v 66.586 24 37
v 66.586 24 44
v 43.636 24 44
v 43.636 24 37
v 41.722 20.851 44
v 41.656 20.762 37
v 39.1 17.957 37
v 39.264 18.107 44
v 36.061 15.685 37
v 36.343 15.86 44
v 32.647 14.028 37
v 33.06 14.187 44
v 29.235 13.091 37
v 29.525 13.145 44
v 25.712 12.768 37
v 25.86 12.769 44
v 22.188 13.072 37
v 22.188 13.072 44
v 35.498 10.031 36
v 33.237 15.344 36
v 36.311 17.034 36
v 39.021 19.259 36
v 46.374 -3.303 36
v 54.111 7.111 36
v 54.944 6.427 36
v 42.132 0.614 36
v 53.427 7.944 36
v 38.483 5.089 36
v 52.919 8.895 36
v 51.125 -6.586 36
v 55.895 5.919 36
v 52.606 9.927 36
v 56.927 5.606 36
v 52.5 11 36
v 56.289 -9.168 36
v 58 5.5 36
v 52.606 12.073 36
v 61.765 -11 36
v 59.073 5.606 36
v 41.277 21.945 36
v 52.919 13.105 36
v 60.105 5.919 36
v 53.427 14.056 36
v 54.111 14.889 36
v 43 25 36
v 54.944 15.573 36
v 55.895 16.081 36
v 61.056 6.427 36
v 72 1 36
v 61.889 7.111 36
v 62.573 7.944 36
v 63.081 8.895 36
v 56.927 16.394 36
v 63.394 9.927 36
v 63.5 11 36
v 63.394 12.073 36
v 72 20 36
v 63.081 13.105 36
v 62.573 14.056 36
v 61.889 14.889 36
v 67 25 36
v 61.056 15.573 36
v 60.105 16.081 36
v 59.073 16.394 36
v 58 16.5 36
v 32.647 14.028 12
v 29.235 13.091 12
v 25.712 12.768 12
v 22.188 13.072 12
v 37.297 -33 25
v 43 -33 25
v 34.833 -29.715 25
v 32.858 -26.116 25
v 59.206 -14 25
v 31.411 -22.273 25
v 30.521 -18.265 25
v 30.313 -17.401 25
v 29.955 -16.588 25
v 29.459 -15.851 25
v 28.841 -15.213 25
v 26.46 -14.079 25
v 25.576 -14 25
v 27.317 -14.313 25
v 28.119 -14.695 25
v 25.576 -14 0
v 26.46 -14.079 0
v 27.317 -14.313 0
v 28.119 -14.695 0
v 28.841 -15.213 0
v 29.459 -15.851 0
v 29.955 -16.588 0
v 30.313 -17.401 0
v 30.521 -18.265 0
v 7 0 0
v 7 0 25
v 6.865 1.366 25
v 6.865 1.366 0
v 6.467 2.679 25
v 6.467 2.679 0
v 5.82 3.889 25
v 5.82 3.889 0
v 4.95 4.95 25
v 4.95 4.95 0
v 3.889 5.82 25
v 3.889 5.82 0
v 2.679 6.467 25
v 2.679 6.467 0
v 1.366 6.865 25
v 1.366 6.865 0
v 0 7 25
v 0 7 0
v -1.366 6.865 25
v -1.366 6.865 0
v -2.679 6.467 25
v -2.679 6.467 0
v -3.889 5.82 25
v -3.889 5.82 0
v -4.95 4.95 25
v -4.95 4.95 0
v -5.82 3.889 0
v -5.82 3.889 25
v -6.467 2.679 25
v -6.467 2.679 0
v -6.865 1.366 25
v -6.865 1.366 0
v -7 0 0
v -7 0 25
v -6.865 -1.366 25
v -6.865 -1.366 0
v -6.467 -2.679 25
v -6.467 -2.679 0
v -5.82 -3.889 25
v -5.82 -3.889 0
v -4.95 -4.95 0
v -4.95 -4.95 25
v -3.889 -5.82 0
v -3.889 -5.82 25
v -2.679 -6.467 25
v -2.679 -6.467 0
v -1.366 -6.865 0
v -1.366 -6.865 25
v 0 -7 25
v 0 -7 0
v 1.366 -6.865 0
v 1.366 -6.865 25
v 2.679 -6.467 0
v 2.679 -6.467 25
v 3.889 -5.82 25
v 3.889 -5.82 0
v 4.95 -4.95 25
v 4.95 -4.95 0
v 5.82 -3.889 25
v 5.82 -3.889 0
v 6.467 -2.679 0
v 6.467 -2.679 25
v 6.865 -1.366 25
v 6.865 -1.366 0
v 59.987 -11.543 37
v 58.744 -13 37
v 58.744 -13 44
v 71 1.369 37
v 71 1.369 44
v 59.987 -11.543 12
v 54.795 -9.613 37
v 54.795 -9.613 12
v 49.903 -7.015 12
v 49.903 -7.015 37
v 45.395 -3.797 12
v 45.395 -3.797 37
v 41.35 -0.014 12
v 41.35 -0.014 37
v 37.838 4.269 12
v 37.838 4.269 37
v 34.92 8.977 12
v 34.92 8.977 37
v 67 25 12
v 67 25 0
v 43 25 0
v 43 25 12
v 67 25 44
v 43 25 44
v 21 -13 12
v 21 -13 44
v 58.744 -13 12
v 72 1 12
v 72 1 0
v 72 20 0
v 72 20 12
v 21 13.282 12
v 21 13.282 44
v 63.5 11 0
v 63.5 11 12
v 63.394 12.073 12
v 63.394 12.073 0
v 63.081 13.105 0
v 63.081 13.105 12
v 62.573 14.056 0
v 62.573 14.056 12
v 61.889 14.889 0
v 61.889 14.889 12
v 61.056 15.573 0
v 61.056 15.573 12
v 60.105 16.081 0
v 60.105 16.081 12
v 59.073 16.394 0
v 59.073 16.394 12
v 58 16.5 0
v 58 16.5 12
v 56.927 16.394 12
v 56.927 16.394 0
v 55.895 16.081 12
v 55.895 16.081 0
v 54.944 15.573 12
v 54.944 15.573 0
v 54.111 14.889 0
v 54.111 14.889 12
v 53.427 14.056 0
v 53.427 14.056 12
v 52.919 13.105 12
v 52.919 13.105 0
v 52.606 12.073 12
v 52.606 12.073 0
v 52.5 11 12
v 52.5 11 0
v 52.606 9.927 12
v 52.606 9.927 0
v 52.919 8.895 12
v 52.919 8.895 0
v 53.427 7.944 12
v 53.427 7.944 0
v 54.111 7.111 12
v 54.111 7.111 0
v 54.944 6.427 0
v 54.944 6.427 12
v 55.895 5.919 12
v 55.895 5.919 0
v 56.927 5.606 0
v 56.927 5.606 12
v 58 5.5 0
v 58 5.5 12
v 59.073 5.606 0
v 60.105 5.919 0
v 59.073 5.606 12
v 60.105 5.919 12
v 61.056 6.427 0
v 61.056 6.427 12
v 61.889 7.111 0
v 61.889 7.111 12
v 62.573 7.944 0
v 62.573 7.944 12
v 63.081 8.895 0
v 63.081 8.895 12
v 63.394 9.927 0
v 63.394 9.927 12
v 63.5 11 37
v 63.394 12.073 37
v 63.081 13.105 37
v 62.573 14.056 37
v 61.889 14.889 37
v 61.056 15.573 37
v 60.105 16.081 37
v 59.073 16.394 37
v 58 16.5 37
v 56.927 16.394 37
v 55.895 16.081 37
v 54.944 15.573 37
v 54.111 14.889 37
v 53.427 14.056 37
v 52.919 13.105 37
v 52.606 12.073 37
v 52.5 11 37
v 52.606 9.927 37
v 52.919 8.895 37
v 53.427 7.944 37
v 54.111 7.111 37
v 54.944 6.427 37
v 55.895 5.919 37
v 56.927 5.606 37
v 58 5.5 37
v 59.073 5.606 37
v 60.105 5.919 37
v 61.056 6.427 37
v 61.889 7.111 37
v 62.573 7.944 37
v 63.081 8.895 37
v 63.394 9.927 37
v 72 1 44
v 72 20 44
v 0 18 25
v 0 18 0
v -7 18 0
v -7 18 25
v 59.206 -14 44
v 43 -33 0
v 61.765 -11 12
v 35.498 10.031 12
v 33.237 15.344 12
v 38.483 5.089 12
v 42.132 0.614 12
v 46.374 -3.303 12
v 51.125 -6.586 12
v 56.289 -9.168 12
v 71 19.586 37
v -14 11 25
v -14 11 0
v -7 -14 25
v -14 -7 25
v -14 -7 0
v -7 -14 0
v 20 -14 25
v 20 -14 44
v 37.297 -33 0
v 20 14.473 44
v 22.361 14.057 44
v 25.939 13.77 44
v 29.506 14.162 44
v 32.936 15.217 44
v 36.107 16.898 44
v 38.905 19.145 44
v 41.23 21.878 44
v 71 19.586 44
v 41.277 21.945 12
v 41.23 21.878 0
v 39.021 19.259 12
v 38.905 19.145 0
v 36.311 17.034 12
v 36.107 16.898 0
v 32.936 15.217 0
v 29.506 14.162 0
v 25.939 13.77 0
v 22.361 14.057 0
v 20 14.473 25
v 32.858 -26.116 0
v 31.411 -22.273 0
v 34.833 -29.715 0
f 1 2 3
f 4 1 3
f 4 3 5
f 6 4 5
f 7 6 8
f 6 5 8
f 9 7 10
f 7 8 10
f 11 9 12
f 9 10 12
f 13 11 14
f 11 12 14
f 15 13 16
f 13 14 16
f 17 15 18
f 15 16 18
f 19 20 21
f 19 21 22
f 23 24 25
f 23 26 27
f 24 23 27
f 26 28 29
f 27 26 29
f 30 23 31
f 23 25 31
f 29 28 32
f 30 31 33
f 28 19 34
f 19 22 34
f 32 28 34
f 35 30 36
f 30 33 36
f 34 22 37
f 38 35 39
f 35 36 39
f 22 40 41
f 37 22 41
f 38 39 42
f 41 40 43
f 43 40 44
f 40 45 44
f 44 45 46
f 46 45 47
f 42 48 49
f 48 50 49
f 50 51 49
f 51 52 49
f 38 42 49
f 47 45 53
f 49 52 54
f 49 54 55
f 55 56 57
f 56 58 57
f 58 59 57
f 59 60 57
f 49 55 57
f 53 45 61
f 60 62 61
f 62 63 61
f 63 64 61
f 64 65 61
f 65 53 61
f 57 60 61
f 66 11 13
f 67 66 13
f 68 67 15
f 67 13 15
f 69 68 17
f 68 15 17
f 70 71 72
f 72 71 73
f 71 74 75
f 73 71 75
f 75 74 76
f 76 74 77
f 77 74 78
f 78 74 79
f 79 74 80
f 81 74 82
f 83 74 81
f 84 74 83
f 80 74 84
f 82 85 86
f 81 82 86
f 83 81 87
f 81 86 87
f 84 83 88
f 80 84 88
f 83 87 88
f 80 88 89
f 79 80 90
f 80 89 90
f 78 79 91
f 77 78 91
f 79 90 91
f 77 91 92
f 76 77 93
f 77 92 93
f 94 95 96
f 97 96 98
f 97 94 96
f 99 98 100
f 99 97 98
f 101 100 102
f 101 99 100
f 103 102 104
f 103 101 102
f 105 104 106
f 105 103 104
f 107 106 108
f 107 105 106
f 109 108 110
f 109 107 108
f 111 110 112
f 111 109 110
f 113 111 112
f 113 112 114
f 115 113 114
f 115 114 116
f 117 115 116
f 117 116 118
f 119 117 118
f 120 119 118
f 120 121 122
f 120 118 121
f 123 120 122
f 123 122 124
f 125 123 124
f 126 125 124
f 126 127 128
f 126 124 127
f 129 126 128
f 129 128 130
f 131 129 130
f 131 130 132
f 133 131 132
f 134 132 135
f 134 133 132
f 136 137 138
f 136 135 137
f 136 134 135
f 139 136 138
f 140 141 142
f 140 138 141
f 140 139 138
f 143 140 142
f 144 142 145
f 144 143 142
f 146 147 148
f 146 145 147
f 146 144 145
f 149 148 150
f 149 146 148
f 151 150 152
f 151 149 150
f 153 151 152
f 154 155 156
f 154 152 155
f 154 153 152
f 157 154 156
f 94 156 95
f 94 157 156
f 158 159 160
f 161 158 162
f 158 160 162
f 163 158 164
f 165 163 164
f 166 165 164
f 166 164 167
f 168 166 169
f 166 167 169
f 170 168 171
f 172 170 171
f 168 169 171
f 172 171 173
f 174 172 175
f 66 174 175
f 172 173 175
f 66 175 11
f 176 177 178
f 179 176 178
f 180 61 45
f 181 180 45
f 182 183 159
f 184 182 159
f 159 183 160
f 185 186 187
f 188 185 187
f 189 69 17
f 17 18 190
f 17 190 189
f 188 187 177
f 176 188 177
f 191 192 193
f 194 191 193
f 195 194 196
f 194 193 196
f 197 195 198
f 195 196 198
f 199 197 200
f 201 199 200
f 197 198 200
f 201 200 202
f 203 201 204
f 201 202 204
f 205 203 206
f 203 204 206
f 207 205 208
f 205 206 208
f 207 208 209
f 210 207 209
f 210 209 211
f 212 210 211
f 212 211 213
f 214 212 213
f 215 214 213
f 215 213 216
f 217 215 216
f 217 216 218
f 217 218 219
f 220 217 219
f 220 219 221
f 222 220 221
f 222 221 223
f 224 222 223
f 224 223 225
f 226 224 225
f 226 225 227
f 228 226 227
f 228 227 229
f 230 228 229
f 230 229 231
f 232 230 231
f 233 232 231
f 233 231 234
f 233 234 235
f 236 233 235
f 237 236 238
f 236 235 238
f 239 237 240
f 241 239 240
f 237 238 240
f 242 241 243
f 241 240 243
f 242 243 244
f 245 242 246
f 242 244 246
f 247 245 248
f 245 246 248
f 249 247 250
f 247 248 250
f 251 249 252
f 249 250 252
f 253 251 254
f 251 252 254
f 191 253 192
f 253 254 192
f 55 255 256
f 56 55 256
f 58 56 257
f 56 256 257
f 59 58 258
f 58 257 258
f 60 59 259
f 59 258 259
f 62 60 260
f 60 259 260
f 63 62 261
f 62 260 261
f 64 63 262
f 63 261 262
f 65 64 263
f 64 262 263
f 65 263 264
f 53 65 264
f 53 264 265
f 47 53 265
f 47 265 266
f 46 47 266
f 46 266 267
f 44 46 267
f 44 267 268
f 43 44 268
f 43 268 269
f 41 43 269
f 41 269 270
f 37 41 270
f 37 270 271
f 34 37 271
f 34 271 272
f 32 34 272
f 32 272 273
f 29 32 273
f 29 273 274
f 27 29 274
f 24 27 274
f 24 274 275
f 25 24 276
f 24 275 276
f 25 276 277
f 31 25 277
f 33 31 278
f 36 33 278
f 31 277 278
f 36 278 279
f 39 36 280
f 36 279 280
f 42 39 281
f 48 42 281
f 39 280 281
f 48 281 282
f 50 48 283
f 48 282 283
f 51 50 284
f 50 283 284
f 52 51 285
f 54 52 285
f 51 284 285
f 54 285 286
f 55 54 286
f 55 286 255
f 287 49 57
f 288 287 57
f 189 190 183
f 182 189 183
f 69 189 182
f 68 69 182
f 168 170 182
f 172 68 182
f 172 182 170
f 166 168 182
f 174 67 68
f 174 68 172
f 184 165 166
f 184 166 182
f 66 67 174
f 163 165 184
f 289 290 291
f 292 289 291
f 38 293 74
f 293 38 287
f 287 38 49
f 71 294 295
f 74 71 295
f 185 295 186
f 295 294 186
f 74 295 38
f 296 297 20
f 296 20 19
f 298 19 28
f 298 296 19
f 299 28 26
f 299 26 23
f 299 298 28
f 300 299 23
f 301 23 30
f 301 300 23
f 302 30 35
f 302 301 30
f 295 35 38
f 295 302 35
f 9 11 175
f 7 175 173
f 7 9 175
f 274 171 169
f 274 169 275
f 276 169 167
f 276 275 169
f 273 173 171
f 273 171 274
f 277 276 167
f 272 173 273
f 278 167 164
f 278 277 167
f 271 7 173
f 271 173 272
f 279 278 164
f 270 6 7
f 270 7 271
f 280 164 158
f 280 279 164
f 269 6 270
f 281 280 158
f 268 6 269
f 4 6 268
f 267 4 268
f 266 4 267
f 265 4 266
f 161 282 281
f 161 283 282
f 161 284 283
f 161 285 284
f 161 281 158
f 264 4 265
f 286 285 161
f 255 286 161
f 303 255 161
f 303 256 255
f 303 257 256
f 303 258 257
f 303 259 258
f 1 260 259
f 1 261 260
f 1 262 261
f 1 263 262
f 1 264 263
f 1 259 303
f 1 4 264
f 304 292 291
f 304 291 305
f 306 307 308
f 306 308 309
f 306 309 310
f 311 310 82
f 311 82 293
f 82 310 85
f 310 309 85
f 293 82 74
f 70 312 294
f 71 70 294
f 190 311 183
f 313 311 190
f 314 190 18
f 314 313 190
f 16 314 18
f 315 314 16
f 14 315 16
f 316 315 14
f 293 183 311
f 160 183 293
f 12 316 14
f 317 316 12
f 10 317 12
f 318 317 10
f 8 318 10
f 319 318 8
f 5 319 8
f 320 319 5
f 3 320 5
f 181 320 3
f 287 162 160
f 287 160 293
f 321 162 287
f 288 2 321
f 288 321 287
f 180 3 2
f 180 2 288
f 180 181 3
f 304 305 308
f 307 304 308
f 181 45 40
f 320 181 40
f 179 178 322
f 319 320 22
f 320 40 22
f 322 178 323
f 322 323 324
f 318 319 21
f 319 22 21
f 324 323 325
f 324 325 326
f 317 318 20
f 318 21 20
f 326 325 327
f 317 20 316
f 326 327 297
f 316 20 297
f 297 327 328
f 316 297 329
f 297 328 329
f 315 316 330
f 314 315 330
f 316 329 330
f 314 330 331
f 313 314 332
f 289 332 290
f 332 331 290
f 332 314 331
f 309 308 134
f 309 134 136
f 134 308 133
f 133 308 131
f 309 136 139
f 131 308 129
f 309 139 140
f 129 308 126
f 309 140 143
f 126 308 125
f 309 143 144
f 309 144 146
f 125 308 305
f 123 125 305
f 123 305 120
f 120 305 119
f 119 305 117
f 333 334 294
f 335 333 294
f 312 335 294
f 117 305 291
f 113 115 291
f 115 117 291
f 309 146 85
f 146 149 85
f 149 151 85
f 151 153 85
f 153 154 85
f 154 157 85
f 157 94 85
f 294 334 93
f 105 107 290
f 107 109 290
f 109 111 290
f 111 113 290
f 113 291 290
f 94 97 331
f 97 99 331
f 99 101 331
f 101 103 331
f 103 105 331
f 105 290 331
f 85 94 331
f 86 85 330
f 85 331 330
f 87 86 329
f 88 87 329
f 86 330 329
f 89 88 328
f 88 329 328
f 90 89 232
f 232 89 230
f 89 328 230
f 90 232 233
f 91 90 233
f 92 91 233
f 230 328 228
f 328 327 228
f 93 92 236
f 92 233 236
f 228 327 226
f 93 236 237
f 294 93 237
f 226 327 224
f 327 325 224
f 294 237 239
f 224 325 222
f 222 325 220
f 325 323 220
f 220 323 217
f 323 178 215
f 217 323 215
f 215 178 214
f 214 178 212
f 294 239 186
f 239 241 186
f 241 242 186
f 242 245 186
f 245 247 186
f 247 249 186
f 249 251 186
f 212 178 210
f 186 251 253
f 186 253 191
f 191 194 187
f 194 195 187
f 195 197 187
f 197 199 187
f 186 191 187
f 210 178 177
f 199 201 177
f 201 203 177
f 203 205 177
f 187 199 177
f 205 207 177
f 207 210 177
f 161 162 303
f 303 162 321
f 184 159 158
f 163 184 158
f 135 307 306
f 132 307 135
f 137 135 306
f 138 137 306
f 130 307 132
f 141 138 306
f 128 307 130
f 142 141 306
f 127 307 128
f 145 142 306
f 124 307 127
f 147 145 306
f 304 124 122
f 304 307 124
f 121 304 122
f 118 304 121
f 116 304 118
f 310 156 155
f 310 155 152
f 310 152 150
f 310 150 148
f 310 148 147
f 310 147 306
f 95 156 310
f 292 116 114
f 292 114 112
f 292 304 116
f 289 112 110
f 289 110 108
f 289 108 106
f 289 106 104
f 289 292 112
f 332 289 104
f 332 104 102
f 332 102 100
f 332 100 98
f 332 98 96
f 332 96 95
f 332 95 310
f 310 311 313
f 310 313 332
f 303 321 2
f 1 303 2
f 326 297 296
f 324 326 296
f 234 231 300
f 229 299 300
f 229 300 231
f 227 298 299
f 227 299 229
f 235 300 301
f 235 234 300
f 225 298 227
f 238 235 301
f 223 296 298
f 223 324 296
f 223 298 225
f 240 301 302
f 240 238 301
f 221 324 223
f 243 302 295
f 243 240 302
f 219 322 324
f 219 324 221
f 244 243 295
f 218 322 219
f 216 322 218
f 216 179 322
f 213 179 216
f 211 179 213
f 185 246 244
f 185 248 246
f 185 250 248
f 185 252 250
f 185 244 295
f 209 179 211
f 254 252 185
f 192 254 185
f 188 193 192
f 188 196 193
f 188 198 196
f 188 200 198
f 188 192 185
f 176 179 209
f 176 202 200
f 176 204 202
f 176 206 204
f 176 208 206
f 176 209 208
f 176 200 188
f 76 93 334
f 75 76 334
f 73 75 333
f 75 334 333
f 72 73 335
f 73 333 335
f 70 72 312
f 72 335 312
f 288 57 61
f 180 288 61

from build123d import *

# Parameters (mm, degrees)
SKETCH1_R               = 7
BOSS_EXTRUDE1_DEPTH     = 44
SKETCH1_2_R             = 7
BOSS_EXTRUDE2_DEPTH     = 44
CUT_EXTRUDE1_DEPTH      = 1
CUT_EXTRUDE1_DEPTH_BACK = 19
SKETCH4_W               = 50.710370583
SKETCH4_H               = 19
CUT_EXTRUDE2_DEPTH      = 52
SKETCH5_R               = 5.5
CUT_EXTRUDE3_DEPTH      = 45
CUT_EXTRUDE4_DEPTH      = 24
CUT_EXTRUDE12_DEPTH     = 7
CUT_EXTRUDE13_DEPTH     = 25


with BuildPart() as part:
    # Sketch1 → Boss-Extrude1 (new body)
    with BuildSketch(Plane.XY):
        with BuildLine():
            Line((-7, -14), (25.575538911, -14))
            ThreePointArc((25.575538911, -14), (28.840774692, -15.213413768), (30.521177653, -18.264705882))
            ThreePointArc((30.521177653, -18.264705882), (32.858007856, -26.115672061), (37.296980053, -33))
            Line((37.296980053, -33), (43, -33))
            Line((43, -33), (72, 1))
            Line((72, 1), (72, 20))
            Line((72, 20), (67, 25))
            Line((67, 25), (43, 25))
            ThreePointArc((43, 25), (34.561098706, 15.982044142), (22.361380836, 14.057085233))
            Line((22.361380836, 14.057085233), (0, 18))
            Line((0, 18), (-7, 18))
            Line((-7, 18), (-14, 11))
            Line((-14, 11), (-14, -7))
            Line((-14, -7), (-7, -14))
        make_face()
        Circle(SKETCH1_R, mode=Mode.SUBTRACT)
    extrude(amount=BOSS_EXTRUDE1_DEPTH)

    # Sketch1_2 → Boss-Extrude2 (add)
    with BuildSketch(Plane.XY):
        with BuildLine():
            Line((-7, -14), (25.575538911, -14))
            ThreePointArc((25.575538911, -14), (28.840774692, -15.213413768), (30.521177653, -18.264705882))
            ThreePointArc((30.521177653, -18.264705882), (32.858007856, -26.115672061), (37.296980053, -33))
            Line((37.296980053, -33), (43, -33))
            Line((43, -33), (72, 1))
            Line((72, 1), (72, 20))
            Line((72, 20), (67, 25))
            Line((67, 25), (43, 25))
            ThreePointArc((43, 25), (34.561098706, 15.982044142), (22.361380836, 14.057085233))
            Line((22.361380836, 14.057085233), (0, 18))
            Line((0, 18), (-7, 18))
            Line((-7, 18), (-14, 11))
            Line((-14, 11), (-14, -7))
            Line((-14, -7), (-7, -14))
        make_face()
        Circle(SKETCH1_2_R, mode=Mode.SUBTRACT)
    extrude(amount=BOSS_EXTRUDE2_DEPTH)

    # Sketch3 → Cut-Extrude1 (cut, two sides)
    with BuildSketch(Plane.XY.offset(44)) as cut_extrude1_sk:
        Polygon((-150.317212119, -14), (25.575538911, -14), (59.205882353, -14), (235.098633383, -14), (235.098633383, -365.78550206), (-150.317212119, -365.78550206), align=None)
    extrude(amount=CUT_EXTRUDE1_DEPTH, mode=Mode.SUBTRACT)
    extrude(cut_extrude1_sk.sketch, amount=-CUT_EXTRUDE1_DEPTH_BACK, mode=Mode.SUBTRACT)

    # Sketch4 → Cut-Extrude2 (cut, through all)
    with BuildSketch(Plane(origin=(0, 18, 0), x_dir=(1, 0, 0), z_dir=(0, 1, 0))):
        with Locations((-5.355185292, -34.5)):
            Rectangle(SKETCH4_W, SKETCH4_H)
    extrude(amount=-CUT_EXTRUDE2_DEPTH, mode=Mode.SUBTRACT)

    # Sketch5 → Cut-Extrude3 (cut, through all)
    with BuildSketch(Plane.XY.offset(44)):
        with Locations((58, 11)):
            Circle(SKETCH5_R)
    extrude(amount=-CUT_EXTRUDE3_DEPTH, mode=Mode.SUBTRACT)

    # Sketch9 → Cut-Extrude4 (cut)
    with BuildSketch(Plane(origin=(0, 0, 12), x_dir=(-1, 0, 0), z_dir=(0, 0, -1))):
        with BuildLine():
            Line((-72, 20), (-67, 25))
            Line((-67, 25), (-43, 25))
            ThreePointArc((-43, 25), (-39.021244343, 19.259333621), (-33.236936549, 15.344294617))
            ThreePointArc((-33.236936549, 15.344294617), (-44.184262982, -1.419294771), (-61.764705882, -11))
            Line((-61.764705882, -11), (-72, 1))
            Line((-72, 1), (-72, 20))
        make_face()
    extrude(amount=-CUT_EXTRUDE4_DEPTH, mode=Mode.SUBTRACT)

    # Sketch16 → Cut-Extrude12 (cut)
    with BuildSketch(Plane.XY.offset(44)):
        with BuildLine():
            Line((21, 13.281706793), (21, -13))
            Line((21, -13), (58.744476296, -13))
            Line((58.744476296, -13), (71, 1.368545033))
            Line((71, 1.368545033), (71, 19.585786438))
            Line((71, 19.585786438), (66.585786438, 24))
            Line((66.585786438, 24), (43.636084685, 24))
            ThreePointArc((43.636084685, 24), (34.740005768, 14.948047079), (22.187732658, 13.07227748))
            Line((22.187732658, 13.07227748), (21, 13.281706793))
        make_face()
    extrude(amount=-CUT_EXTRUDE12_DEPTH, mode=Mode.SUBTRACT)

    # Sketch17 → Cut-Extrude13 (cut)
    with BuildSketch(Plane.XY.offset(37)):
        with BuildLine():
            Line((58.744476296, -13), (59.986847747, -11.543426575))
            ThreePointArc((59.986847747, -11.543426575), (43.310181683, -1.972127362), (32.646682943, 14.028208705))
            ThreePointArc((32.646682943, 14.028208705), (27.481076416, 12.851449437), (22.187732658, 13.07227748))
            Line((22.187732658, 13.07227748), (21, 13.281706793))
            Line((21, 13.281706793), (21, -13))
            Line((21, -13), (58.744476296, -13))
        make_face()
    extrude(amount=-CUT_EXTRUDE13_DEPTH, mode=Mode.SUBTRACT)


solid = part.part
